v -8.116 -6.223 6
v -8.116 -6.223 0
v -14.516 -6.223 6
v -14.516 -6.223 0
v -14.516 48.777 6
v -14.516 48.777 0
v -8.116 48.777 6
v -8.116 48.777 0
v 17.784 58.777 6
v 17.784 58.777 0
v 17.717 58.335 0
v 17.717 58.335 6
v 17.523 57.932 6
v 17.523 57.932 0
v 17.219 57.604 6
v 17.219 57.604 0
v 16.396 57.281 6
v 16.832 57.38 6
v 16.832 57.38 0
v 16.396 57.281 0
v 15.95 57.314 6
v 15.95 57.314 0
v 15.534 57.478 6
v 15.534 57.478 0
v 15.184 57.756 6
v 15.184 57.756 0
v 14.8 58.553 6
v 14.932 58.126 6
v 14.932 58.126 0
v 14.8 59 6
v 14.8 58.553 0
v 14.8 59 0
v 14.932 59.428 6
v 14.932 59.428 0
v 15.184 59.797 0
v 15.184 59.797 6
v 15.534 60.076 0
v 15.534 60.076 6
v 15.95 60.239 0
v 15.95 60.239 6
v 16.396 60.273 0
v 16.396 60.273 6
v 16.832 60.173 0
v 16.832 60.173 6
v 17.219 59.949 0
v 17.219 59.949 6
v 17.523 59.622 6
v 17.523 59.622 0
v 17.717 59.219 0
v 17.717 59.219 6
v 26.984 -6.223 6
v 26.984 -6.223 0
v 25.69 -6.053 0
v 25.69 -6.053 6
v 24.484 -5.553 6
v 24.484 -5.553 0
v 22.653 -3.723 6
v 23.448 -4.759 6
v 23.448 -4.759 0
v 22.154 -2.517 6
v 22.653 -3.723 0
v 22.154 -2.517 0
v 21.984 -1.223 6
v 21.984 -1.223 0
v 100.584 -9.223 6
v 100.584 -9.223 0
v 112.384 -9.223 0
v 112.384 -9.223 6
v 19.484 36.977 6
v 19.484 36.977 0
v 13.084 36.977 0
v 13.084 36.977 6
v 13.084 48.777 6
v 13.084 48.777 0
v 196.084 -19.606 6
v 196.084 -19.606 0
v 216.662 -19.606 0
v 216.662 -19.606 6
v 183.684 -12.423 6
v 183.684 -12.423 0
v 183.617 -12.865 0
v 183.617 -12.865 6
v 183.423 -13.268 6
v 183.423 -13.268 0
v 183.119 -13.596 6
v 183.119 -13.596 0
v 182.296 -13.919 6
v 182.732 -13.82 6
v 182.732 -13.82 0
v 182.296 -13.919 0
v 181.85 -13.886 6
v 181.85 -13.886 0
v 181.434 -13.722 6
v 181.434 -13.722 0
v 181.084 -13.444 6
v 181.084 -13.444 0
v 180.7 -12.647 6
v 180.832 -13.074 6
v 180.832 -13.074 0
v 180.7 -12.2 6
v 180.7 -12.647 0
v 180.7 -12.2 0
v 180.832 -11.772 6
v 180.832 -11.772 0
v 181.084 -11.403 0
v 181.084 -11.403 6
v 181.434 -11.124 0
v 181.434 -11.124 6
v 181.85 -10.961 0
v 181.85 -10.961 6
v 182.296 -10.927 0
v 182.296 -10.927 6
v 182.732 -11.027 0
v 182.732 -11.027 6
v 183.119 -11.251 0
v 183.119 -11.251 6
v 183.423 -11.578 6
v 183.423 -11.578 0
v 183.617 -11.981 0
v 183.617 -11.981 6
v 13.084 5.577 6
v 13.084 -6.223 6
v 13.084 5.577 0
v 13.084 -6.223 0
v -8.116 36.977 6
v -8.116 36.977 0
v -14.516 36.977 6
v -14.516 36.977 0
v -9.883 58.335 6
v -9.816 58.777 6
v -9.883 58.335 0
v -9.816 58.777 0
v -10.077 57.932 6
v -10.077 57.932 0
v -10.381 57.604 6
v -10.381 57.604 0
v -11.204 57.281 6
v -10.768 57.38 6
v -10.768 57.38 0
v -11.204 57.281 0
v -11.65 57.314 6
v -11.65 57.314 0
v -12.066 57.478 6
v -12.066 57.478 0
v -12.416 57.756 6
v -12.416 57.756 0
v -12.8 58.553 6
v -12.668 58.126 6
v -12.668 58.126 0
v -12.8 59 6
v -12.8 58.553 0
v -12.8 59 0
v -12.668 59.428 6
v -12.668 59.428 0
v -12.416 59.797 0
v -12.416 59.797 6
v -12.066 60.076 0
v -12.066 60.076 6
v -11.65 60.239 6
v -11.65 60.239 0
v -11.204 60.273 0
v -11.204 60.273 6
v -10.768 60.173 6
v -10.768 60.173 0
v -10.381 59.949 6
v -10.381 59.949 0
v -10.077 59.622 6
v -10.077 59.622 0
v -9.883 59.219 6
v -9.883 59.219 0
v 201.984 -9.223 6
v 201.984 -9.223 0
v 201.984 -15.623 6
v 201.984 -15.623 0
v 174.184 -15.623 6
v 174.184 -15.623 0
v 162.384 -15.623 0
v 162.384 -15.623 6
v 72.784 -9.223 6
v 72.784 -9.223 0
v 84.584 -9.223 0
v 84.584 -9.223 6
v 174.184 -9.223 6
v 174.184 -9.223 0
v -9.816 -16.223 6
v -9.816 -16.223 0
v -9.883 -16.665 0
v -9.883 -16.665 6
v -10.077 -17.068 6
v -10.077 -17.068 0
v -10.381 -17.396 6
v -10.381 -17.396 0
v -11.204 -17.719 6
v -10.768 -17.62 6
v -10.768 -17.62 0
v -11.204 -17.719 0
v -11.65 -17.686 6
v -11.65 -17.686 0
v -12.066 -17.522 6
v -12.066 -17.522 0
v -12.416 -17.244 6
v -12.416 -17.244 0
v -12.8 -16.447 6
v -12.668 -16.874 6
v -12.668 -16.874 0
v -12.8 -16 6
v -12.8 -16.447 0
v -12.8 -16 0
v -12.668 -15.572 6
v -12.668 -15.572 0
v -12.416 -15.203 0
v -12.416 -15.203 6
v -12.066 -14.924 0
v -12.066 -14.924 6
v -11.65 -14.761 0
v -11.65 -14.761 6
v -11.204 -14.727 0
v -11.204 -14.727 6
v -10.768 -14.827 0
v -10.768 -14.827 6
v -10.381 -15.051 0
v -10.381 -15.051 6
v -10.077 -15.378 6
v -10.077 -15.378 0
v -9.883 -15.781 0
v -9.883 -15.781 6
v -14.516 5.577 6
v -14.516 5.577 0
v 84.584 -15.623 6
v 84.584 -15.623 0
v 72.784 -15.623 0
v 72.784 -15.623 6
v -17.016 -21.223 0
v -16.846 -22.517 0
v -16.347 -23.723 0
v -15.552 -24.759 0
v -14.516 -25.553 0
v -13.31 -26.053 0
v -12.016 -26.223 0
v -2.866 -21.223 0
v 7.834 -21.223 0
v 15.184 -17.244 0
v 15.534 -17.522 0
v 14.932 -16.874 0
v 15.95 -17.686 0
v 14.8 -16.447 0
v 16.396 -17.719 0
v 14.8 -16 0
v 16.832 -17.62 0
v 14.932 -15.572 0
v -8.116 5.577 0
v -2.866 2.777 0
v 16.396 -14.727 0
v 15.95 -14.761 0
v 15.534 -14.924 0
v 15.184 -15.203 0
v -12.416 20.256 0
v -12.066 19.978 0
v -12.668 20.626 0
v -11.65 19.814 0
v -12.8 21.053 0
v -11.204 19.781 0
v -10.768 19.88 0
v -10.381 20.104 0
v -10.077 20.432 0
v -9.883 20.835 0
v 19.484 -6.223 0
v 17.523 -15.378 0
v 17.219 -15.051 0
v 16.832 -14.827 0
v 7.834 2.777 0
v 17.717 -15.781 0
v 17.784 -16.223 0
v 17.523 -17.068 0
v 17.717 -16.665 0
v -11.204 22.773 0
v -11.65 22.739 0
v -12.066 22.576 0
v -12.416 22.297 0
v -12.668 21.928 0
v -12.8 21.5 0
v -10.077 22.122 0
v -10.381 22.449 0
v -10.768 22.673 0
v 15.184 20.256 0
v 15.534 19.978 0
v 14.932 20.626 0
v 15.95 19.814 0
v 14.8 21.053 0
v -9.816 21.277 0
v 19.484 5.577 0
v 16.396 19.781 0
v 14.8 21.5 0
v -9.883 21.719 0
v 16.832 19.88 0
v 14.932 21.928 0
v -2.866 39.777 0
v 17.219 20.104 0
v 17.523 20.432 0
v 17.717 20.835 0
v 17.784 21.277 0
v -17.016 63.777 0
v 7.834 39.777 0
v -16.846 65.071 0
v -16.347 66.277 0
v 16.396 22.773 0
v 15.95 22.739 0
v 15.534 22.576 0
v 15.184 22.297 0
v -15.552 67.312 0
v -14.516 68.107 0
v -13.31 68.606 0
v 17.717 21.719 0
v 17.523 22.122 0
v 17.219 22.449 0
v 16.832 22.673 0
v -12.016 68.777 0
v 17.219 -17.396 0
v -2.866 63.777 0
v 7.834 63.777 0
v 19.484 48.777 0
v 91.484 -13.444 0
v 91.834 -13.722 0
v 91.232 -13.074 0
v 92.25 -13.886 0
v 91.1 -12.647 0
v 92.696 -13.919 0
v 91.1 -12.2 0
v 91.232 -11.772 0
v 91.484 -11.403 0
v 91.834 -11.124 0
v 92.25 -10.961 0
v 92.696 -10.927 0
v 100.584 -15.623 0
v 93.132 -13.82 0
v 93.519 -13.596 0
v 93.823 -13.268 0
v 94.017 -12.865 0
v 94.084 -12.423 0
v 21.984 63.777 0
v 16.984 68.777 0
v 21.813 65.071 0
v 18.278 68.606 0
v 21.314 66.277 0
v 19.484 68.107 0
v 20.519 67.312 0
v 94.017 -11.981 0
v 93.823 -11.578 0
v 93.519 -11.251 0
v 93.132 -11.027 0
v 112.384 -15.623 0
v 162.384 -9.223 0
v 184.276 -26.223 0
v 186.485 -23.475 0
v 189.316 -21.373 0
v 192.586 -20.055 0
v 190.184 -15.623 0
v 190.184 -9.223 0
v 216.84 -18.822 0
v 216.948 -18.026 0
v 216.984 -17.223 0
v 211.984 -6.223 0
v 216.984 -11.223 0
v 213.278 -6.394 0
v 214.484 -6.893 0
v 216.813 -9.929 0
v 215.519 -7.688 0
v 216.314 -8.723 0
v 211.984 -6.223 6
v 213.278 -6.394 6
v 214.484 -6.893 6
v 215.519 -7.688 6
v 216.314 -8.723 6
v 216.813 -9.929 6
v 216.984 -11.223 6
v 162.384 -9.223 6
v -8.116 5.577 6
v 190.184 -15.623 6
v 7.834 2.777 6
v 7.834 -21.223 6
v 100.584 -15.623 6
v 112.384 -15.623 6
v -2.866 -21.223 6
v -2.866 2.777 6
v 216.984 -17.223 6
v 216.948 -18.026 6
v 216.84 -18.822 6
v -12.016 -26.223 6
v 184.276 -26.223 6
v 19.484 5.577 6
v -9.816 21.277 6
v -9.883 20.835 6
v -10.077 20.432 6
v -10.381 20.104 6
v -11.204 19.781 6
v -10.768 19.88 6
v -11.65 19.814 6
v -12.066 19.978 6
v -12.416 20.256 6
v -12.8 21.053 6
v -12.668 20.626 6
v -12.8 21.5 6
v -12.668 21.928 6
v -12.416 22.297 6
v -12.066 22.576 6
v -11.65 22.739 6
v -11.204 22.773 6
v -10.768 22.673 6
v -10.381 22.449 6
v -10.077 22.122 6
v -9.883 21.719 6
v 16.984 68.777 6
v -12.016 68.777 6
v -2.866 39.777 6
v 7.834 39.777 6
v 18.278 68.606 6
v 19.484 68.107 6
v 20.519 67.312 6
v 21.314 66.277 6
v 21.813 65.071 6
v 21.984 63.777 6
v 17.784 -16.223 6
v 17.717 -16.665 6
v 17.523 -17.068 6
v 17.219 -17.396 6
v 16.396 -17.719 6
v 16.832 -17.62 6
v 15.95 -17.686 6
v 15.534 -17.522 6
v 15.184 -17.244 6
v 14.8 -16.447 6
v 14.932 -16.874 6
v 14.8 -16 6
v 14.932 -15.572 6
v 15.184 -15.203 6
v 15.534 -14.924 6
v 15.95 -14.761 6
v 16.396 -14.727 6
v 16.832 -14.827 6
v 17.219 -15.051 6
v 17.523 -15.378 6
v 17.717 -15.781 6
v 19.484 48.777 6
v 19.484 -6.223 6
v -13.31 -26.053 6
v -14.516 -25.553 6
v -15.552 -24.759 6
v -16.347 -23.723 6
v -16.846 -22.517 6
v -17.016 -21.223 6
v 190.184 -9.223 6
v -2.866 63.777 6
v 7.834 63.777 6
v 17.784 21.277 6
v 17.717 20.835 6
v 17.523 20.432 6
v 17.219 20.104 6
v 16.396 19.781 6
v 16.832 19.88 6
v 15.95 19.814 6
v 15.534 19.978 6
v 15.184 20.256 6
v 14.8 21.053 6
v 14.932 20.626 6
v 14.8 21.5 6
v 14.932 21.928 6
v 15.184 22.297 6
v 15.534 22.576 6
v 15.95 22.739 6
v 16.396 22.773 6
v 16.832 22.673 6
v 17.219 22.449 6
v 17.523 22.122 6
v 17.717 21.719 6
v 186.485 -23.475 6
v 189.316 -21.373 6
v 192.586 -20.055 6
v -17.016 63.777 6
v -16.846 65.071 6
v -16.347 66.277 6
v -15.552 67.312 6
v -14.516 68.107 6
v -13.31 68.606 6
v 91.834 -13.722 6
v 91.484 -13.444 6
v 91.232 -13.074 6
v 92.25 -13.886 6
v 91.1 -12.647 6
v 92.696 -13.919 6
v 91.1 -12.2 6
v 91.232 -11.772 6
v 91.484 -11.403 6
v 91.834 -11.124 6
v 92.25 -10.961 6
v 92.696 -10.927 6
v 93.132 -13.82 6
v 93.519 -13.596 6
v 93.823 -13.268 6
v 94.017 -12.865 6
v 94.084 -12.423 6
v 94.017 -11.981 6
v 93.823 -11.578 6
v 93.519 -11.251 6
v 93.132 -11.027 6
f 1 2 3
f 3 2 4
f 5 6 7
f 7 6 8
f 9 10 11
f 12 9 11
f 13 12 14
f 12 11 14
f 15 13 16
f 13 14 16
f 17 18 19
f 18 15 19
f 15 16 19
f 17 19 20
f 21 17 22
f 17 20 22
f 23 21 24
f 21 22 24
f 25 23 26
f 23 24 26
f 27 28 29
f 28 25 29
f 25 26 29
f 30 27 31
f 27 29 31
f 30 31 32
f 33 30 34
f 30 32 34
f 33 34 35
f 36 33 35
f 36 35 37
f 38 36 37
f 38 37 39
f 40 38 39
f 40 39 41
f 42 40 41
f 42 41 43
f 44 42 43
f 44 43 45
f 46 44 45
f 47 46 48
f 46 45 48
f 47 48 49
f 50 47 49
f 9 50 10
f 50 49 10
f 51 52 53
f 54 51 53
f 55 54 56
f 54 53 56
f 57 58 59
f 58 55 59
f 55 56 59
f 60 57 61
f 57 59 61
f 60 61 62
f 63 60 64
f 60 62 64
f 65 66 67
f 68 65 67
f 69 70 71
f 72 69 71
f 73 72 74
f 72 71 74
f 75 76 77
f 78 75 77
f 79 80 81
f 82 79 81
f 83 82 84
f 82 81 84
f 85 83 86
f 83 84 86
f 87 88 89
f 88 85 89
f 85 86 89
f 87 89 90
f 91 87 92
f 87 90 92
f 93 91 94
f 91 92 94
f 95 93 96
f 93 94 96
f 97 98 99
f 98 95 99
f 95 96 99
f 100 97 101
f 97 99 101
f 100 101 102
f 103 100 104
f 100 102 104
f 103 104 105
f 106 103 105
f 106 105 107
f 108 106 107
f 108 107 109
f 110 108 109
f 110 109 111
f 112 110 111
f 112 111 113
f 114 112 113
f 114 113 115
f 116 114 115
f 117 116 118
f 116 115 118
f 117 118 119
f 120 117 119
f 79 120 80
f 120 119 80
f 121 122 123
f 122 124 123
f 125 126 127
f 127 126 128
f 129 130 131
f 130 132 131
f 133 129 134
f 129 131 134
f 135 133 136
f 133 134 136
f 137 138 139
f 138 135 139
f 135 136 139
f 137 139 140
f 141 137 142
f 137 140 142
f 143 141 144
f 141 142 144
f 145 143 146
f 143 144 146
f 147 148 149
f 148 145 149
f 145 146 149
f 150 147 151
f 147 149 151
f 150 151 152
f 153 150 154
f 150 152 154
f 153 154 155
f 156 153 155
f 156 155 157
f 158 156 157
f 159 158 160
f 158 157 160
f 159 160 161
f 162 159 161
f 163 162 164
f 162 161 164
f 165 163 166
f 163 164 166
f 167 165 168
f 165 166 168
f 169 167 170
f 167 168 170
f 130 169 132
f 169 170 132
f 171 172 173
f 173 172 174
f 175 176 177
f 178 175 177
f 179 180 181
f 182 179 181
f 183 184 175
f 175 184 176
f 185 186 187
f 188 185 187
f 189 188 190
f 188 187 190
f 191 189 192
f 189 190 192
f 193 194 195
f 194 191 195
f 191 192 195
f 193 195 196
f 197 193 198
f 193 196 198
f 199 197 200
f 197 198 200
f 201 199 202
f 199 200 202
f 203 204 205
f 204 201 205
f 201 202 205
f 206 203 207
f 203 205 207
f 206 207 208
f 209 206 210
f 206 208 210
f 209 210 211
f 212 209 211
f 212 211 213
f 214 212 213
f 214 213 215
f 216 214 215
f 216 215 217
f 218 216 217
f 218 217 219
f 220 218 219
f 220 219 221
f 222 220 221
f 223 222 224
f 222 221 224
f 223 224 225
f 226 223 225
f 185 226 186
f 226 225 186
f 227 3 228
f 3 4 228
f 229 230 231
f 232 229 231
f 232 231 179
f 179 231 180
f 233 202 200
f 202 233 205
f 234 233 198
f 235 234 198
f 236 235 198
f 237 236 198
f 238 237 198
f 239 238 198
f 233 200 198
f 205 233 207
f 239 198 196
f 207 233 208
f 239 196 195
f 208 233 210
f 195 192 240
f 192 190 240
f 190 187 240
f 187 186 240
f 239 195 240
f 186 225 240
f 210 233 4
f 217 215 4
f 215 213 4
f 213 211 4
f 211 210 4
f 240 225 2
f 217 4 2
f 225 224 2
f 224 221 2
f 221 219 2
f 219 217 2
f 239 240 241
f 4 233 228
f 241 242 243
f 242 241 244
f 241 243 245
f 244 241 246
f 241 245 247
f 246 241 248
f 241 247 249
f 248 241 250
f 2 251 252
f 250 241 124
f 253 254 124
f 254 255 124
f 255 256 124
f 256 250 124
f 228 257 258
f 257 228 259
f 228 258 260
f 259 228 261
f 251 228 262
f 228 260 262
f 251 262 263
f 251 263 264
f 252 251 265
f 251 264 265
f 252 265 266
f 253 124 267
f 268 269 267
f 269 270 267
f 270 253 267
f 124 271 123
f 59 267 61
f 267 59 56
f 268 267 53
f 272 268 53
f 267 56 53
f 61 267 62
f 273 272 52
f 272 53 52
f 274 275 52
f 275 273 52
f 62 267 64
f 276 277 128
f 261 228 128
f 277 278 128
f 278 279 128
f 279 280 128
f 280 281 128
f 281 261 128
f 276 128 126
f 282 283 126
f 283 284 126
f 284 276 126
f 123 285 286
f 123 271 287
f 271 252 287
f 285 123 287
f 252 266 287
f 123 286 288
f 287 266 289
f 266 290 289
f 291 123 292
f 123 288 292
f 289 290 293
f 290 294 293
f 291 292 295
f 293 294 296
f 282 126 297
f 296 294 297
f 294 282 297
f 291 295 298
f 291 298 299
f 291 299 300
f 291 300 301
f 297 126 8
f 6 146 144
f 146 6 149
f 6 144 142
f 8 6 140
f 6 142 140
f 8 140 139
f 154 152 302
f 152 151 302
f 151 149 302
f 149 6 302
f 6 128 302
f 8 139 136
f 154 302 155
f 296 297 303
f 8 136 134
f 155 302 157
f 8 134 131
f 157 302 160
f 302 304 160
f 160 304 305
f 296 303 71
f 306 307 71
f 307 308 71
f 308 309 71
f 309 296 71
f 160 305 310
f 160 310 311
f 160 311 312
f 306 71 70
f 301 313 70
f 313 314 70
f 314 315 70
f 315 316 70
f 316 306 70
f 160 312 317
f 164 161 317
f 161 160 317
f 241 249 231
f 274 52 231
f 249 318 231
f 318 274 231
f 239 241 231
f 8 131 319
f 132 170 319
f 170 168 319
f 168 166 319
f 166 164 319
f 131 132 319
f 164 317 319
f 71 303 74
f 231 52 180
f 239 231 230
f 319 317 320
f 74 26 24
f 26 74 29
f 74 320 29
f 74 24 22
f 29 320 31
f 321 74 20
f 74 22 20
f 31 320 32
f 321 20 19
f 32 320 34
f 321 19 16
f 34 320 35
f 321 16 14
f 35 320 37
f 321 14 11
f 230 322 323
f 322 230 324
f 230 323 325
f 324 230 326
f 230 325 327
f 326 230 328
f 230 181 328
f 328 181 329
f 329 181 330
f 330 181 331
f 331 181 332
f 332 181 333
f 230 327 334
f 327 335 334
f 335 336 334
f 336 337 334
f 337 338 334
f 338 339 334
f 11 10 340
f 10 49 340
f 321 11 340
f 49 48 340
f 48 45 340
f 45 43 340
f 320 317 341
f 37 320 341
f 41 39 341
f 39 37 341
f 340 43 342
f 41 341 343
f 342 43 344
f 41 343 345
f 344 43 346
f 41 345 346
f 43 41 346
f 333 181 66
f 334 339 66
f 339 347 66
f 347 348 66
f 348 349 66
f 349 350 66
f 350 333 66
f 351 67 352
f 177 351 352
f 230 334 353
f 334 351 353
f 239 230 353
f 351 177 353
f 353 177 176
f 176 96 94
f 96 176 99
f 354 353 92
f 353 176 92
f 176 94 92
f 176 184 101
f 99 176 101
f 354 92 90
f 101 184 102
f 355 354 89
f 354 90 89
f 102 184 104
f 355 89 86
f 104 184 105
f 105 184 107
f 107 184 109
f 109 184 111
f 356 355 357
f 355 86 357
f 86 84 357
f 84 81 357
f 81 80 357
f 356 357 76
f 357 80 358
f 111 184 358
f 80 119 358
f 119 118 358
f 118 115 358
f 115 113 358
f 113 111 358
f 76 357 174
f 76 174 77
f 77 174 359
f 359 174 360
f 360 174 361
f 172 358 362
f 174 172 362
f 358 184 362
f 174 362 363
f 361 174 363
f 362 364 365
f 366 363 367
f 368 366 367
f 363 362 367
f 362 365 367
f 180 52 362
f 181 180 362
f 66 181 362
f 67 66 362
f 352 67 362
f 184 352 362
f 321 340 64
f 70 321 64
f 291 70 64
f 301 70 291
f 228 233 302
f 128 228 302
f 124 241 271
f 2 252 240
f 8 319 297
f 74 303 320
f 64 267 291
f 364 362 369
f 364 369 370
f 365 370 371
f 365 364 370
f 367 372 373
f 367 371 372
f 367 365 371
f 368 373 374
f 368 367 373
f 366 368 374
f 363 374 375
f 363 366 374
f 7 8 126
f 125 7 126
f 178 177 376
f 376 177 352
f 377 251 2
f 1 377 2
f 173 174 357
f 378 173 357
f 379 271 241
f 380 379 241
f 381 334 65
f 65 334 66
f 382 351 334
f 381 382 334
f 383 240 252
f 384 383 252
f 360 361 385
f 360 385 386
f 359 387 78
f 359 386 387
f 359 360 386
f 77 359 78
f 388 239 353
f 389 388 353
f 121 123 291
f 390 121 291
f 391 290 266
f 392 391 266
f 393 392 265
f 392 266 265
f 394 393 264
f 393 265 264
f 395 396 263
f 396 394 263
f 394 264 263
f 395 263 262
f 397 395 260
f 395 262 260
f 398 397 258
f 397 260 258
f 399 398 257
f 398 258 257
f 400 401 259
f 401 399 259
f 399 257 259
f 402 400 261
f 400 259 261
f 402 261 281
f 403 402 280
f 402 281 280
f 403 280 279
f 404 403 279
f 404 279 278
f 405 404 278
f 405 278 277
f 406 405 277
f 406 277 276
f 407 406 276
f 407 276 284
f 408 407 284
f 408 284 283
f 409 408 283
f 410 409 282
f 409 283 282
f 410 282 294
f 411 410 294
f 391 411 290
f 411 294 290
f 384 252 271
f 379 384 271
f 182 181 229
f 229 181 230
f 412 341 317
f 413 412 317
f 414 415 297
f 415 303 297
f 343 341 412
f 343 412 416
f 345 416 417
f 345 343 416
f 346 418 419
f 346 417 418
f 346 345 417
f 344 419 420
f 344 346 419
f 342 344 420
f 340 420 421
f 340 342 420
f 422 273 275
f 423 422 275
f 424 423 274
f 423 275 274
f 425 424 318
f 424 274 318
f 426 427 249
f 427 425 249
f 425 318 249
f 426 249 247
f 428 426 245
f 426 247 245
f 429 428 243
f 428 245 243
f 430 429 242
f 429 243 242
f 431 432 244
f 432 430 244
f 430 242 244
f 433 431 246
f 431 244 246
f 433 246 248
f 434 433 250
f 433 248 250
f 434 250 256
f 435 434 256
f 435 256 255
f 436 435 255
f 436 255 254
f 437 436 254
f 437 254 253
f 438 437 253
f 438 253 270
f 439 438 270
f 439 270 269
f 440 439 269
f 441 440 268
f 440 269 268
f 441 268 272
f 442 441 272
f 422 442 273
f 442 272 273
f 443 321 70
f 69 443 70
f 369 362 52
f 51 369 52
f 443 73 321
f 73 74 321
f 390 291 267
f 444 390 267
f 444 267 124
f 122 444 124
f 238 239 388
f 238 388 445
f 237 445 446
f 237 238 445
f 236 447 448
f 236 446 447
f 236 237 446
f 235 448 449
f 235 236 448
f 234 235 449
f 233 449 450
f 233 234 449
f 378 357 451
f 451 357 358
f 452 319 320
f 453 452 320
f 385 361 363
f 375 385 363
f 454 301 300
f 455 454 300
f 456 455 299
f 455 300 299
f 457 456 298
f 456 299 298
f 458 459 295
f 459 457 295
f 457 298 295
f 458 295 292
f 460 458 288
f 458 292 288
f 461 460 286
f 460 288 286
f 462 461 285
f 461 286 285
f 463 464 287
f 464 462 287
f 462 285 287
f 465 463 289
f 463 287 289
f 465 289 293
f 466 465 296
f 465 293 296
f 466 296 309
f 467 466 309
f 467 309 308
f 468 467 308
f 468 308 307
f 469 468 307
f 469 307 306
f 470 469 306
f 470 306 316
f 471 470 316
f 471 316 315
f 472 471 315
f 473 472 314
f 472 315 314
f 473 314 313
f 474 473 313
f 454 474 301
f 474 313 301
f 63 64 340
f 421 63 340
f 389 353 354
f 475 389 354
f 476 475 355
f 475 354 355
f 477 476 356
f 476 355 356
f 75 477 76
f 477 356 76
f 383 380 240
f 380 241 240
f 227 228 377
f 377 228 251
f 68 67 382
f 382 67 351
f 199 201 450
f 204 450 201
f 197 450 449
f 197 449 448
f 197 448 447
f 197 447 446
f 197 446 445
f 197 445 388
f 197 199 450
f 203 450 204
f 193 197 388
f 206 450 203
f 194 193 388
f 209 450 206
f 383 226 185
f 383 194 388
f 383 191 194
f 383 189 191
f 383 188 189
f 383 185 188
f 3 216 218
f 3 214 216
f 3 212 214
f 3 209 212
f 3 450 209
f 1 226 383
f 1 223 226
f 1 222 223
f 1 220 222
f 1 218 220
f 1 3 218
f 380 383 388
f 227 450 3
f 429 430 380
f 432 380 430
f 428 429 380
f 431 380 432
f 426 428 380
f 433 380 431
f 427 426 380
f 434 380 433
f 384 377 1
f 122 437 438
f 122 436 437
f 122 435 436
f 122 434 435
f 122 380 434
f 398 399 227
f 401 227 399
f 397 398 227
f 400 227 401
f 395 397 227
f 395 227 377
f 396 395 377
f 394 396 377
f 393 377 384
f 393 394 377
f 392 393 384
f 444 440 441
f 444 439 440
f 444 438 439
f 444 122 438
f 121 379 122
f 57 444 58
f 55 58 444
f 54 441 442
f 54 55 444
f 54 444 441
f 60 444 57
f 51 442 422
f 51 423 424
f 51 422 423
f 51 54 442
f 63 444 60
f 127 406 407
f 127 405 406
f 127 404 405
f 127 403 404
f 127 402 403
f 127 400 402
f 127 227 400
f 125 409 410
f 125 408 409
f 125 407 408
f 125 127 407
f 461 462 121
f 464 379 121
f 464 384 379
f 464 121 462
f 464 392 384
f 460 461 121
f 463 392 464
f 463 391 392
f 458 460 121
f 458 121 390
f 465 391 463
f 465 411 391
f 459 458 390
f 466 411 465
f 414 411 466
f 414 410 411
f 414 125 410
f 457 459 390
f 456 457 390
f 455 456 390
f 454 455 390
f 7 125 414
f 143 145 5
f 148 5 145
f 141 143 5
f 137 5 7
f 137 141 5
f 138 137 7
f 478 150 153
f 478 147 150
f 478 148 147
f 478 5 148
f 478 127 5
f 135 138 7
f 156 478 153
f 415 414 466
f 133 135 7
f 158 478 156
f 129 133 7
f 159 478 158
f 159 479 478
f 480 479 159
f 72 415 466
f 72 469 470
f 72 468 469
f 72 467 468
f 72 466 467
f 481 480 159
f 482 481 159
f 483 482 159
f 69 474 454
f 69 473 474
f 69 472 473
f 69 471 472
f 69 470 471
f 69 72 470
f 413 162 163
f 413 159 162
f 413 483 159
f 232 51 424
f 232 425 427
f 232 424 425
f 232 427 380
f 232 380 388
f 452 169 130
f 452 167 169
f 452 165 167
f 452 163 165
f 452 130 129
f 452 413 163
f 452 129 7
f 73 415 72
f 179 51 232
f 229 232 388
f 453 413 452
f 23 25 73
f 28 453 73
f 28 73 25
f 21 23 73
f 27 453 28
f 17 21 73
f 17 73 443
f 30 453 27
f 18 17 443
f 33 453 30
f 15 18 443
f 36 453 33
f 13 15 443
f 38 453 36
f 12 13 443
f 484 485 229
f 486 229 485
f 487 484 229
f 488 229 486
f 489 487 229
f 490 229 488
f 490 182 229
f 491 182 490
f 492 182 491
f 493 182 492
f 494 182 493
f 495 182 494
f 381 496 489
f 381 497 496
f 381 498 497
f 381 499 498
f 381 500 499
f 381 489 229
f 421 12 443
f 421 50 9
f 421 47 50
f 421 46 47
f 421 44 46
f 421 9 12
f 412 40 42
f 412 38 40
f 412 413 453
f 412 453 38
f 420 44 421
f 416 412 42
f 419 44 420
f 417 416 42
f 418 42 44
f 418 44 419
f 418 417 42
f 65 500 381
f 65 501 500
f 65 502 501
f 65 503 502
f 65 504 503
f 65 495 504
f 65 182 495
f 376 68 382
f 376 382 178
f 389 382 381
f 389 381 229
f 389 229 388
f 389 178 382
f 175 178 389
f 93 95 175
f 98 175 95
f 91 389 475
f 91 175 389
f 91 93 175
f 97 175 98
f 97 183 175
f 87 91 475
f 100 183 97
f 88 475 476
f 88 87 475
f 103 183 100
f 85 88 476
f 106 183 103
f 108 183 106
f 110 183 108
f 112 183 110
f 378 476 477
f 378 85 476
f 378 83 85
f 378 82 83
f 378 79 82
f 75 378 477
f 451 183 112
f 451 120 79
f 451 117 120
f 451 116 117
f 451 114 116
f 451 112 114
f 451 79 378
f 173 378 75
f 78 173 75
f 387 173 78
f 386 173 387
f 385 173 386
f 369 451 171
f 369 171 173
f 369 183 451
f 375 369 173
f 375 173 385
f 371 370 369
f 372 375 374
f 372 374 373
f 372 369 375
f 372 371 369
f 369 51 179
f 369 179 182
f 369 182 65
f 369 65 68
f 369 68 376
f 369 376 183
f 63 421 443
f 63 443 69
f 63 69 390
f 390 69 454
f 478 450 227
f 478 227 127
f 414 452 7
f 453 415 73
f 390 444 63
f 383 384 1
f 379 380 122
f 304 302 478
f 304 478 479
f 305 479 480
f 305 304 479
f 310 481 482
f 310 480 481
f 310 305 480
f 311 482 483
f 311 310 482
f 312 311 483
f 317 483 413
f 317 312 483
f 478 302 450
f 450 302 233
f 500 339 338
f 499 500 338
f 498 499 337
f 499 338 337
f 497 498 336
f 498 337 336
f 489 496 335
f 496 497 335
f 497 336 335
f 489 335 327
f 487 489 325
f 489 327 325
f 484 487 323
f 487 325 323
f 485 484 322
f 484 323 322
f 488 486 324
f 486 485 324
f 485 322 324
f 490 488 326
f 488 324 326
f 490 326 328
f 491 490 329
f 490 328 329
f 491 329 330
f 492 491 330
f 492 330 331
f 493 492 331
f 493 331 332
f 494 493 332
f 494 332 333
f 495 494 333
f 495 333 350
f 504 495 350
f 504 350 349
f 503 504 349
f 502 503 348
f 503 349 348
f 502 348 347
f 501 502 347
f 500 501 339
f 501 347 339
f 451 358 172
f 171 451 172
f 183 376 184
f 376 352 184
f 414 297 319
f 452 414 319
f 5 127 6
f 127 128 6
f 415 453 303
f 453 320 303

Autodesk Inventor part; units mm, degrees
ref_plane "YZ Plane" through (0, 0, 0) normal (1, 0, 0) x (0, 1, 0)
ref_plane "XZ Plane" through (0, 0, 0) normal (0, 1, 0) x (-1, 0, 0)
ref_plane "XY Plane" through (0, 0, 0) normal (0, 0, 1) x (1, 0, 0)
sketch "Sketch1" plane through (0, 0, 0) normal (0, 0, 1) x (1, 0, 0)
  line L0 (196.0836, -19.606) -> (216.6625, -19.606)
  arc A0 (216.6625, -19.606) -> (216.9836, -17.2233) centre (207.9836, -17.2233) ccw
  line L1 (216.9836, -17.2233) -> (216.9836, -11.2233)
  arc A1 (216.9836, -11.2233) -> (211.9836, -6.2233) centre (211.9836, -11.2233) ccw
  line L2 (211.9836, -6.2233) -> (26.9836, -6.2233)
  arc A2 (21.9836, -1.2233) -> (26.9836, -6.2233) centre (26.9836, -1.2233) ccw
  line L3 (21.9836, -1.2233) -> (21.9836, 63.7767)
  arc A3 (21.9836, 63.7767) -> (16.9836, 68.7767) centre (16.9836, 63.7767) ccw
  line L4 (16.9836, 68.7767) -> (-12.0164, 68.7767)
  arc A4 (-12.0164, 68.7767) -> (-17.0164, 63.7767) centre (-12.0164, 63.7767) ccw
  line L5 (-17.0164, 63.7767) -> (-17.0164, -21.2233)
  arc A5 (-17.0164, -21.2233) -> (-12.0164, -26.2233) centre (-12.0164, -21.2233) ccw
  line L6 (-12.0164, -26.2233) -> (184.2764, -26.2233)
  arc A6 (196.0836, -19.606) -> (184.2764, -26.2233) centre (196.0836, -33.4483) ccw
  circle A7 centre (-11.3164, 21.2767) radius 1.5
  circle A8 centre (16.2836, 21.2767) radius 1.5
  circle A9 centre (16.2836, -16.2233) radius 1.5
  circle A10 centre (-11.3164, -16.2233) radius 1.5
  circle A11 centre (92.5836, -12.4233) radius 1.5
  circle A12 centre (182.1836, -12.4233) radius 1.5
  circle A13 centre (-11.3164, 58.7767) radius 1.5
  circle A14 centre (16.2836, 58.7767) radius 1.5
  line L7 (13.0836, 36.9767) -> (13.0836, 48.7767)
  line L8 (13.0836, 48.7767) -> (19.4836, 48.7767)
  line L9 (19.4836, 48.7767) -> (19.4836, 36.9767)
  line L10 (19.4836, 36.9767) -> (13.0836, 36.9767)
  line L11 (-8.1164, 48.7767) -> (-8.1164, 36.9767)
  line L12 (-8.1164, 36.9767) -> (-14.5164, 36.9767)
  line L13 (-14.5164, 36.9767) -> (-14.5164, 48.7767)
  line L14 (-14.5164, 48.7767) -> (-8.1164, 48.7767)
  line L15 (13.0836, -6.2233) -> (13.0836, 5.5767)
  line L16 (13.0836, 5.5767) -> (19.4836, 5.5767)
  line L17 (19.4836, 5.5767) -> (19.4836, -6.2233)
  line L18 (19.4836, -6.2233) -> (13.0836, -6.2233)
  line L19 (201.9836, -9.2233) -> (201.9836, -15.6233)
  line L20 (201.9836, -15.6233) -> (190.1836, -15.6233)
  line L21 (190.1836, -15.6233) -> (190.1836, -9.2233)
  line L22 (190.1836, -9.2233) -> (201.9836, -9.2233)
  line L23 (174.1836, -9.2233) -> (174.1836, -15.6233)
  line L24 (174.1836, -15.6233) -> (162.3836, -15.6233)
  line L25 (162.3836, -15.6233) -> (162.3836, -9.2233)
  line L26 (162.3836, -9.2233) -> (174.1836, -9.2233)
  line L27 (112.3836, -9.2233) -> (112.3836, -15.6233)
  line L28 (112.3836, -15.6233) -> (100.5836, -15.6233)
  line L29 (100.5836, -15.6233) -> (100.5836, -9.2233)
  line L30 (100.5836, -9.2233) -> (112.3836, -9.2233)
  line L31 (84.5836, -9.2233) -> (84.5836, -15.6233)
  line L32 (84.5836, -15.6233) -> (72.7836, -15.6233)
  line L33 (72.7836, -15.6233) -> (72.7836, -9.2233)
  line L34 (72.7836, -9.2233) -> (84.5836, -9.2233)
  line L35 (-8.1164, 5.5767) -> (-8.1164, -6.2233)
  line L36 (-8.1164, -6.2233) -> (-14.5164, -6.2233)
  line L37 (-14.5164, -6.2233) -> (-14.5164, 5.5767)
  line L38 (-14.5164, 5.5767) -> (-8.1164, 5.5767)
  line L39 (7.8336, 63.7767) -> (7.8336, 39.7767)
  line L40 (7.8336, 39.7767) -> (-2.8664, 39.7767)
  line L41 (-2.8664, 39.7767) -> (-2.8664, 63.7767)
  line L42 (-2.8664, 63.7767) -> (7.8336, 63.7767)
  line L43 (7.8336, 2.7767) -> (7.8336, -21.2233)
  line L44 (7.8336, -21.2233) -> (-2.8664, -21.2233)
  line L45 (-2.8664, -21.2233) -> (-2.8664, 2.7767)
  line L46 (-2.8664, 2.7767) -> (7.8336, 2.7767)
  point P0 (0, 0)
  point P1 (0, 0)
extrude "Extrusion1" add sketch "Sketch1" along normal blind 6
properties part number "zCar_a"
